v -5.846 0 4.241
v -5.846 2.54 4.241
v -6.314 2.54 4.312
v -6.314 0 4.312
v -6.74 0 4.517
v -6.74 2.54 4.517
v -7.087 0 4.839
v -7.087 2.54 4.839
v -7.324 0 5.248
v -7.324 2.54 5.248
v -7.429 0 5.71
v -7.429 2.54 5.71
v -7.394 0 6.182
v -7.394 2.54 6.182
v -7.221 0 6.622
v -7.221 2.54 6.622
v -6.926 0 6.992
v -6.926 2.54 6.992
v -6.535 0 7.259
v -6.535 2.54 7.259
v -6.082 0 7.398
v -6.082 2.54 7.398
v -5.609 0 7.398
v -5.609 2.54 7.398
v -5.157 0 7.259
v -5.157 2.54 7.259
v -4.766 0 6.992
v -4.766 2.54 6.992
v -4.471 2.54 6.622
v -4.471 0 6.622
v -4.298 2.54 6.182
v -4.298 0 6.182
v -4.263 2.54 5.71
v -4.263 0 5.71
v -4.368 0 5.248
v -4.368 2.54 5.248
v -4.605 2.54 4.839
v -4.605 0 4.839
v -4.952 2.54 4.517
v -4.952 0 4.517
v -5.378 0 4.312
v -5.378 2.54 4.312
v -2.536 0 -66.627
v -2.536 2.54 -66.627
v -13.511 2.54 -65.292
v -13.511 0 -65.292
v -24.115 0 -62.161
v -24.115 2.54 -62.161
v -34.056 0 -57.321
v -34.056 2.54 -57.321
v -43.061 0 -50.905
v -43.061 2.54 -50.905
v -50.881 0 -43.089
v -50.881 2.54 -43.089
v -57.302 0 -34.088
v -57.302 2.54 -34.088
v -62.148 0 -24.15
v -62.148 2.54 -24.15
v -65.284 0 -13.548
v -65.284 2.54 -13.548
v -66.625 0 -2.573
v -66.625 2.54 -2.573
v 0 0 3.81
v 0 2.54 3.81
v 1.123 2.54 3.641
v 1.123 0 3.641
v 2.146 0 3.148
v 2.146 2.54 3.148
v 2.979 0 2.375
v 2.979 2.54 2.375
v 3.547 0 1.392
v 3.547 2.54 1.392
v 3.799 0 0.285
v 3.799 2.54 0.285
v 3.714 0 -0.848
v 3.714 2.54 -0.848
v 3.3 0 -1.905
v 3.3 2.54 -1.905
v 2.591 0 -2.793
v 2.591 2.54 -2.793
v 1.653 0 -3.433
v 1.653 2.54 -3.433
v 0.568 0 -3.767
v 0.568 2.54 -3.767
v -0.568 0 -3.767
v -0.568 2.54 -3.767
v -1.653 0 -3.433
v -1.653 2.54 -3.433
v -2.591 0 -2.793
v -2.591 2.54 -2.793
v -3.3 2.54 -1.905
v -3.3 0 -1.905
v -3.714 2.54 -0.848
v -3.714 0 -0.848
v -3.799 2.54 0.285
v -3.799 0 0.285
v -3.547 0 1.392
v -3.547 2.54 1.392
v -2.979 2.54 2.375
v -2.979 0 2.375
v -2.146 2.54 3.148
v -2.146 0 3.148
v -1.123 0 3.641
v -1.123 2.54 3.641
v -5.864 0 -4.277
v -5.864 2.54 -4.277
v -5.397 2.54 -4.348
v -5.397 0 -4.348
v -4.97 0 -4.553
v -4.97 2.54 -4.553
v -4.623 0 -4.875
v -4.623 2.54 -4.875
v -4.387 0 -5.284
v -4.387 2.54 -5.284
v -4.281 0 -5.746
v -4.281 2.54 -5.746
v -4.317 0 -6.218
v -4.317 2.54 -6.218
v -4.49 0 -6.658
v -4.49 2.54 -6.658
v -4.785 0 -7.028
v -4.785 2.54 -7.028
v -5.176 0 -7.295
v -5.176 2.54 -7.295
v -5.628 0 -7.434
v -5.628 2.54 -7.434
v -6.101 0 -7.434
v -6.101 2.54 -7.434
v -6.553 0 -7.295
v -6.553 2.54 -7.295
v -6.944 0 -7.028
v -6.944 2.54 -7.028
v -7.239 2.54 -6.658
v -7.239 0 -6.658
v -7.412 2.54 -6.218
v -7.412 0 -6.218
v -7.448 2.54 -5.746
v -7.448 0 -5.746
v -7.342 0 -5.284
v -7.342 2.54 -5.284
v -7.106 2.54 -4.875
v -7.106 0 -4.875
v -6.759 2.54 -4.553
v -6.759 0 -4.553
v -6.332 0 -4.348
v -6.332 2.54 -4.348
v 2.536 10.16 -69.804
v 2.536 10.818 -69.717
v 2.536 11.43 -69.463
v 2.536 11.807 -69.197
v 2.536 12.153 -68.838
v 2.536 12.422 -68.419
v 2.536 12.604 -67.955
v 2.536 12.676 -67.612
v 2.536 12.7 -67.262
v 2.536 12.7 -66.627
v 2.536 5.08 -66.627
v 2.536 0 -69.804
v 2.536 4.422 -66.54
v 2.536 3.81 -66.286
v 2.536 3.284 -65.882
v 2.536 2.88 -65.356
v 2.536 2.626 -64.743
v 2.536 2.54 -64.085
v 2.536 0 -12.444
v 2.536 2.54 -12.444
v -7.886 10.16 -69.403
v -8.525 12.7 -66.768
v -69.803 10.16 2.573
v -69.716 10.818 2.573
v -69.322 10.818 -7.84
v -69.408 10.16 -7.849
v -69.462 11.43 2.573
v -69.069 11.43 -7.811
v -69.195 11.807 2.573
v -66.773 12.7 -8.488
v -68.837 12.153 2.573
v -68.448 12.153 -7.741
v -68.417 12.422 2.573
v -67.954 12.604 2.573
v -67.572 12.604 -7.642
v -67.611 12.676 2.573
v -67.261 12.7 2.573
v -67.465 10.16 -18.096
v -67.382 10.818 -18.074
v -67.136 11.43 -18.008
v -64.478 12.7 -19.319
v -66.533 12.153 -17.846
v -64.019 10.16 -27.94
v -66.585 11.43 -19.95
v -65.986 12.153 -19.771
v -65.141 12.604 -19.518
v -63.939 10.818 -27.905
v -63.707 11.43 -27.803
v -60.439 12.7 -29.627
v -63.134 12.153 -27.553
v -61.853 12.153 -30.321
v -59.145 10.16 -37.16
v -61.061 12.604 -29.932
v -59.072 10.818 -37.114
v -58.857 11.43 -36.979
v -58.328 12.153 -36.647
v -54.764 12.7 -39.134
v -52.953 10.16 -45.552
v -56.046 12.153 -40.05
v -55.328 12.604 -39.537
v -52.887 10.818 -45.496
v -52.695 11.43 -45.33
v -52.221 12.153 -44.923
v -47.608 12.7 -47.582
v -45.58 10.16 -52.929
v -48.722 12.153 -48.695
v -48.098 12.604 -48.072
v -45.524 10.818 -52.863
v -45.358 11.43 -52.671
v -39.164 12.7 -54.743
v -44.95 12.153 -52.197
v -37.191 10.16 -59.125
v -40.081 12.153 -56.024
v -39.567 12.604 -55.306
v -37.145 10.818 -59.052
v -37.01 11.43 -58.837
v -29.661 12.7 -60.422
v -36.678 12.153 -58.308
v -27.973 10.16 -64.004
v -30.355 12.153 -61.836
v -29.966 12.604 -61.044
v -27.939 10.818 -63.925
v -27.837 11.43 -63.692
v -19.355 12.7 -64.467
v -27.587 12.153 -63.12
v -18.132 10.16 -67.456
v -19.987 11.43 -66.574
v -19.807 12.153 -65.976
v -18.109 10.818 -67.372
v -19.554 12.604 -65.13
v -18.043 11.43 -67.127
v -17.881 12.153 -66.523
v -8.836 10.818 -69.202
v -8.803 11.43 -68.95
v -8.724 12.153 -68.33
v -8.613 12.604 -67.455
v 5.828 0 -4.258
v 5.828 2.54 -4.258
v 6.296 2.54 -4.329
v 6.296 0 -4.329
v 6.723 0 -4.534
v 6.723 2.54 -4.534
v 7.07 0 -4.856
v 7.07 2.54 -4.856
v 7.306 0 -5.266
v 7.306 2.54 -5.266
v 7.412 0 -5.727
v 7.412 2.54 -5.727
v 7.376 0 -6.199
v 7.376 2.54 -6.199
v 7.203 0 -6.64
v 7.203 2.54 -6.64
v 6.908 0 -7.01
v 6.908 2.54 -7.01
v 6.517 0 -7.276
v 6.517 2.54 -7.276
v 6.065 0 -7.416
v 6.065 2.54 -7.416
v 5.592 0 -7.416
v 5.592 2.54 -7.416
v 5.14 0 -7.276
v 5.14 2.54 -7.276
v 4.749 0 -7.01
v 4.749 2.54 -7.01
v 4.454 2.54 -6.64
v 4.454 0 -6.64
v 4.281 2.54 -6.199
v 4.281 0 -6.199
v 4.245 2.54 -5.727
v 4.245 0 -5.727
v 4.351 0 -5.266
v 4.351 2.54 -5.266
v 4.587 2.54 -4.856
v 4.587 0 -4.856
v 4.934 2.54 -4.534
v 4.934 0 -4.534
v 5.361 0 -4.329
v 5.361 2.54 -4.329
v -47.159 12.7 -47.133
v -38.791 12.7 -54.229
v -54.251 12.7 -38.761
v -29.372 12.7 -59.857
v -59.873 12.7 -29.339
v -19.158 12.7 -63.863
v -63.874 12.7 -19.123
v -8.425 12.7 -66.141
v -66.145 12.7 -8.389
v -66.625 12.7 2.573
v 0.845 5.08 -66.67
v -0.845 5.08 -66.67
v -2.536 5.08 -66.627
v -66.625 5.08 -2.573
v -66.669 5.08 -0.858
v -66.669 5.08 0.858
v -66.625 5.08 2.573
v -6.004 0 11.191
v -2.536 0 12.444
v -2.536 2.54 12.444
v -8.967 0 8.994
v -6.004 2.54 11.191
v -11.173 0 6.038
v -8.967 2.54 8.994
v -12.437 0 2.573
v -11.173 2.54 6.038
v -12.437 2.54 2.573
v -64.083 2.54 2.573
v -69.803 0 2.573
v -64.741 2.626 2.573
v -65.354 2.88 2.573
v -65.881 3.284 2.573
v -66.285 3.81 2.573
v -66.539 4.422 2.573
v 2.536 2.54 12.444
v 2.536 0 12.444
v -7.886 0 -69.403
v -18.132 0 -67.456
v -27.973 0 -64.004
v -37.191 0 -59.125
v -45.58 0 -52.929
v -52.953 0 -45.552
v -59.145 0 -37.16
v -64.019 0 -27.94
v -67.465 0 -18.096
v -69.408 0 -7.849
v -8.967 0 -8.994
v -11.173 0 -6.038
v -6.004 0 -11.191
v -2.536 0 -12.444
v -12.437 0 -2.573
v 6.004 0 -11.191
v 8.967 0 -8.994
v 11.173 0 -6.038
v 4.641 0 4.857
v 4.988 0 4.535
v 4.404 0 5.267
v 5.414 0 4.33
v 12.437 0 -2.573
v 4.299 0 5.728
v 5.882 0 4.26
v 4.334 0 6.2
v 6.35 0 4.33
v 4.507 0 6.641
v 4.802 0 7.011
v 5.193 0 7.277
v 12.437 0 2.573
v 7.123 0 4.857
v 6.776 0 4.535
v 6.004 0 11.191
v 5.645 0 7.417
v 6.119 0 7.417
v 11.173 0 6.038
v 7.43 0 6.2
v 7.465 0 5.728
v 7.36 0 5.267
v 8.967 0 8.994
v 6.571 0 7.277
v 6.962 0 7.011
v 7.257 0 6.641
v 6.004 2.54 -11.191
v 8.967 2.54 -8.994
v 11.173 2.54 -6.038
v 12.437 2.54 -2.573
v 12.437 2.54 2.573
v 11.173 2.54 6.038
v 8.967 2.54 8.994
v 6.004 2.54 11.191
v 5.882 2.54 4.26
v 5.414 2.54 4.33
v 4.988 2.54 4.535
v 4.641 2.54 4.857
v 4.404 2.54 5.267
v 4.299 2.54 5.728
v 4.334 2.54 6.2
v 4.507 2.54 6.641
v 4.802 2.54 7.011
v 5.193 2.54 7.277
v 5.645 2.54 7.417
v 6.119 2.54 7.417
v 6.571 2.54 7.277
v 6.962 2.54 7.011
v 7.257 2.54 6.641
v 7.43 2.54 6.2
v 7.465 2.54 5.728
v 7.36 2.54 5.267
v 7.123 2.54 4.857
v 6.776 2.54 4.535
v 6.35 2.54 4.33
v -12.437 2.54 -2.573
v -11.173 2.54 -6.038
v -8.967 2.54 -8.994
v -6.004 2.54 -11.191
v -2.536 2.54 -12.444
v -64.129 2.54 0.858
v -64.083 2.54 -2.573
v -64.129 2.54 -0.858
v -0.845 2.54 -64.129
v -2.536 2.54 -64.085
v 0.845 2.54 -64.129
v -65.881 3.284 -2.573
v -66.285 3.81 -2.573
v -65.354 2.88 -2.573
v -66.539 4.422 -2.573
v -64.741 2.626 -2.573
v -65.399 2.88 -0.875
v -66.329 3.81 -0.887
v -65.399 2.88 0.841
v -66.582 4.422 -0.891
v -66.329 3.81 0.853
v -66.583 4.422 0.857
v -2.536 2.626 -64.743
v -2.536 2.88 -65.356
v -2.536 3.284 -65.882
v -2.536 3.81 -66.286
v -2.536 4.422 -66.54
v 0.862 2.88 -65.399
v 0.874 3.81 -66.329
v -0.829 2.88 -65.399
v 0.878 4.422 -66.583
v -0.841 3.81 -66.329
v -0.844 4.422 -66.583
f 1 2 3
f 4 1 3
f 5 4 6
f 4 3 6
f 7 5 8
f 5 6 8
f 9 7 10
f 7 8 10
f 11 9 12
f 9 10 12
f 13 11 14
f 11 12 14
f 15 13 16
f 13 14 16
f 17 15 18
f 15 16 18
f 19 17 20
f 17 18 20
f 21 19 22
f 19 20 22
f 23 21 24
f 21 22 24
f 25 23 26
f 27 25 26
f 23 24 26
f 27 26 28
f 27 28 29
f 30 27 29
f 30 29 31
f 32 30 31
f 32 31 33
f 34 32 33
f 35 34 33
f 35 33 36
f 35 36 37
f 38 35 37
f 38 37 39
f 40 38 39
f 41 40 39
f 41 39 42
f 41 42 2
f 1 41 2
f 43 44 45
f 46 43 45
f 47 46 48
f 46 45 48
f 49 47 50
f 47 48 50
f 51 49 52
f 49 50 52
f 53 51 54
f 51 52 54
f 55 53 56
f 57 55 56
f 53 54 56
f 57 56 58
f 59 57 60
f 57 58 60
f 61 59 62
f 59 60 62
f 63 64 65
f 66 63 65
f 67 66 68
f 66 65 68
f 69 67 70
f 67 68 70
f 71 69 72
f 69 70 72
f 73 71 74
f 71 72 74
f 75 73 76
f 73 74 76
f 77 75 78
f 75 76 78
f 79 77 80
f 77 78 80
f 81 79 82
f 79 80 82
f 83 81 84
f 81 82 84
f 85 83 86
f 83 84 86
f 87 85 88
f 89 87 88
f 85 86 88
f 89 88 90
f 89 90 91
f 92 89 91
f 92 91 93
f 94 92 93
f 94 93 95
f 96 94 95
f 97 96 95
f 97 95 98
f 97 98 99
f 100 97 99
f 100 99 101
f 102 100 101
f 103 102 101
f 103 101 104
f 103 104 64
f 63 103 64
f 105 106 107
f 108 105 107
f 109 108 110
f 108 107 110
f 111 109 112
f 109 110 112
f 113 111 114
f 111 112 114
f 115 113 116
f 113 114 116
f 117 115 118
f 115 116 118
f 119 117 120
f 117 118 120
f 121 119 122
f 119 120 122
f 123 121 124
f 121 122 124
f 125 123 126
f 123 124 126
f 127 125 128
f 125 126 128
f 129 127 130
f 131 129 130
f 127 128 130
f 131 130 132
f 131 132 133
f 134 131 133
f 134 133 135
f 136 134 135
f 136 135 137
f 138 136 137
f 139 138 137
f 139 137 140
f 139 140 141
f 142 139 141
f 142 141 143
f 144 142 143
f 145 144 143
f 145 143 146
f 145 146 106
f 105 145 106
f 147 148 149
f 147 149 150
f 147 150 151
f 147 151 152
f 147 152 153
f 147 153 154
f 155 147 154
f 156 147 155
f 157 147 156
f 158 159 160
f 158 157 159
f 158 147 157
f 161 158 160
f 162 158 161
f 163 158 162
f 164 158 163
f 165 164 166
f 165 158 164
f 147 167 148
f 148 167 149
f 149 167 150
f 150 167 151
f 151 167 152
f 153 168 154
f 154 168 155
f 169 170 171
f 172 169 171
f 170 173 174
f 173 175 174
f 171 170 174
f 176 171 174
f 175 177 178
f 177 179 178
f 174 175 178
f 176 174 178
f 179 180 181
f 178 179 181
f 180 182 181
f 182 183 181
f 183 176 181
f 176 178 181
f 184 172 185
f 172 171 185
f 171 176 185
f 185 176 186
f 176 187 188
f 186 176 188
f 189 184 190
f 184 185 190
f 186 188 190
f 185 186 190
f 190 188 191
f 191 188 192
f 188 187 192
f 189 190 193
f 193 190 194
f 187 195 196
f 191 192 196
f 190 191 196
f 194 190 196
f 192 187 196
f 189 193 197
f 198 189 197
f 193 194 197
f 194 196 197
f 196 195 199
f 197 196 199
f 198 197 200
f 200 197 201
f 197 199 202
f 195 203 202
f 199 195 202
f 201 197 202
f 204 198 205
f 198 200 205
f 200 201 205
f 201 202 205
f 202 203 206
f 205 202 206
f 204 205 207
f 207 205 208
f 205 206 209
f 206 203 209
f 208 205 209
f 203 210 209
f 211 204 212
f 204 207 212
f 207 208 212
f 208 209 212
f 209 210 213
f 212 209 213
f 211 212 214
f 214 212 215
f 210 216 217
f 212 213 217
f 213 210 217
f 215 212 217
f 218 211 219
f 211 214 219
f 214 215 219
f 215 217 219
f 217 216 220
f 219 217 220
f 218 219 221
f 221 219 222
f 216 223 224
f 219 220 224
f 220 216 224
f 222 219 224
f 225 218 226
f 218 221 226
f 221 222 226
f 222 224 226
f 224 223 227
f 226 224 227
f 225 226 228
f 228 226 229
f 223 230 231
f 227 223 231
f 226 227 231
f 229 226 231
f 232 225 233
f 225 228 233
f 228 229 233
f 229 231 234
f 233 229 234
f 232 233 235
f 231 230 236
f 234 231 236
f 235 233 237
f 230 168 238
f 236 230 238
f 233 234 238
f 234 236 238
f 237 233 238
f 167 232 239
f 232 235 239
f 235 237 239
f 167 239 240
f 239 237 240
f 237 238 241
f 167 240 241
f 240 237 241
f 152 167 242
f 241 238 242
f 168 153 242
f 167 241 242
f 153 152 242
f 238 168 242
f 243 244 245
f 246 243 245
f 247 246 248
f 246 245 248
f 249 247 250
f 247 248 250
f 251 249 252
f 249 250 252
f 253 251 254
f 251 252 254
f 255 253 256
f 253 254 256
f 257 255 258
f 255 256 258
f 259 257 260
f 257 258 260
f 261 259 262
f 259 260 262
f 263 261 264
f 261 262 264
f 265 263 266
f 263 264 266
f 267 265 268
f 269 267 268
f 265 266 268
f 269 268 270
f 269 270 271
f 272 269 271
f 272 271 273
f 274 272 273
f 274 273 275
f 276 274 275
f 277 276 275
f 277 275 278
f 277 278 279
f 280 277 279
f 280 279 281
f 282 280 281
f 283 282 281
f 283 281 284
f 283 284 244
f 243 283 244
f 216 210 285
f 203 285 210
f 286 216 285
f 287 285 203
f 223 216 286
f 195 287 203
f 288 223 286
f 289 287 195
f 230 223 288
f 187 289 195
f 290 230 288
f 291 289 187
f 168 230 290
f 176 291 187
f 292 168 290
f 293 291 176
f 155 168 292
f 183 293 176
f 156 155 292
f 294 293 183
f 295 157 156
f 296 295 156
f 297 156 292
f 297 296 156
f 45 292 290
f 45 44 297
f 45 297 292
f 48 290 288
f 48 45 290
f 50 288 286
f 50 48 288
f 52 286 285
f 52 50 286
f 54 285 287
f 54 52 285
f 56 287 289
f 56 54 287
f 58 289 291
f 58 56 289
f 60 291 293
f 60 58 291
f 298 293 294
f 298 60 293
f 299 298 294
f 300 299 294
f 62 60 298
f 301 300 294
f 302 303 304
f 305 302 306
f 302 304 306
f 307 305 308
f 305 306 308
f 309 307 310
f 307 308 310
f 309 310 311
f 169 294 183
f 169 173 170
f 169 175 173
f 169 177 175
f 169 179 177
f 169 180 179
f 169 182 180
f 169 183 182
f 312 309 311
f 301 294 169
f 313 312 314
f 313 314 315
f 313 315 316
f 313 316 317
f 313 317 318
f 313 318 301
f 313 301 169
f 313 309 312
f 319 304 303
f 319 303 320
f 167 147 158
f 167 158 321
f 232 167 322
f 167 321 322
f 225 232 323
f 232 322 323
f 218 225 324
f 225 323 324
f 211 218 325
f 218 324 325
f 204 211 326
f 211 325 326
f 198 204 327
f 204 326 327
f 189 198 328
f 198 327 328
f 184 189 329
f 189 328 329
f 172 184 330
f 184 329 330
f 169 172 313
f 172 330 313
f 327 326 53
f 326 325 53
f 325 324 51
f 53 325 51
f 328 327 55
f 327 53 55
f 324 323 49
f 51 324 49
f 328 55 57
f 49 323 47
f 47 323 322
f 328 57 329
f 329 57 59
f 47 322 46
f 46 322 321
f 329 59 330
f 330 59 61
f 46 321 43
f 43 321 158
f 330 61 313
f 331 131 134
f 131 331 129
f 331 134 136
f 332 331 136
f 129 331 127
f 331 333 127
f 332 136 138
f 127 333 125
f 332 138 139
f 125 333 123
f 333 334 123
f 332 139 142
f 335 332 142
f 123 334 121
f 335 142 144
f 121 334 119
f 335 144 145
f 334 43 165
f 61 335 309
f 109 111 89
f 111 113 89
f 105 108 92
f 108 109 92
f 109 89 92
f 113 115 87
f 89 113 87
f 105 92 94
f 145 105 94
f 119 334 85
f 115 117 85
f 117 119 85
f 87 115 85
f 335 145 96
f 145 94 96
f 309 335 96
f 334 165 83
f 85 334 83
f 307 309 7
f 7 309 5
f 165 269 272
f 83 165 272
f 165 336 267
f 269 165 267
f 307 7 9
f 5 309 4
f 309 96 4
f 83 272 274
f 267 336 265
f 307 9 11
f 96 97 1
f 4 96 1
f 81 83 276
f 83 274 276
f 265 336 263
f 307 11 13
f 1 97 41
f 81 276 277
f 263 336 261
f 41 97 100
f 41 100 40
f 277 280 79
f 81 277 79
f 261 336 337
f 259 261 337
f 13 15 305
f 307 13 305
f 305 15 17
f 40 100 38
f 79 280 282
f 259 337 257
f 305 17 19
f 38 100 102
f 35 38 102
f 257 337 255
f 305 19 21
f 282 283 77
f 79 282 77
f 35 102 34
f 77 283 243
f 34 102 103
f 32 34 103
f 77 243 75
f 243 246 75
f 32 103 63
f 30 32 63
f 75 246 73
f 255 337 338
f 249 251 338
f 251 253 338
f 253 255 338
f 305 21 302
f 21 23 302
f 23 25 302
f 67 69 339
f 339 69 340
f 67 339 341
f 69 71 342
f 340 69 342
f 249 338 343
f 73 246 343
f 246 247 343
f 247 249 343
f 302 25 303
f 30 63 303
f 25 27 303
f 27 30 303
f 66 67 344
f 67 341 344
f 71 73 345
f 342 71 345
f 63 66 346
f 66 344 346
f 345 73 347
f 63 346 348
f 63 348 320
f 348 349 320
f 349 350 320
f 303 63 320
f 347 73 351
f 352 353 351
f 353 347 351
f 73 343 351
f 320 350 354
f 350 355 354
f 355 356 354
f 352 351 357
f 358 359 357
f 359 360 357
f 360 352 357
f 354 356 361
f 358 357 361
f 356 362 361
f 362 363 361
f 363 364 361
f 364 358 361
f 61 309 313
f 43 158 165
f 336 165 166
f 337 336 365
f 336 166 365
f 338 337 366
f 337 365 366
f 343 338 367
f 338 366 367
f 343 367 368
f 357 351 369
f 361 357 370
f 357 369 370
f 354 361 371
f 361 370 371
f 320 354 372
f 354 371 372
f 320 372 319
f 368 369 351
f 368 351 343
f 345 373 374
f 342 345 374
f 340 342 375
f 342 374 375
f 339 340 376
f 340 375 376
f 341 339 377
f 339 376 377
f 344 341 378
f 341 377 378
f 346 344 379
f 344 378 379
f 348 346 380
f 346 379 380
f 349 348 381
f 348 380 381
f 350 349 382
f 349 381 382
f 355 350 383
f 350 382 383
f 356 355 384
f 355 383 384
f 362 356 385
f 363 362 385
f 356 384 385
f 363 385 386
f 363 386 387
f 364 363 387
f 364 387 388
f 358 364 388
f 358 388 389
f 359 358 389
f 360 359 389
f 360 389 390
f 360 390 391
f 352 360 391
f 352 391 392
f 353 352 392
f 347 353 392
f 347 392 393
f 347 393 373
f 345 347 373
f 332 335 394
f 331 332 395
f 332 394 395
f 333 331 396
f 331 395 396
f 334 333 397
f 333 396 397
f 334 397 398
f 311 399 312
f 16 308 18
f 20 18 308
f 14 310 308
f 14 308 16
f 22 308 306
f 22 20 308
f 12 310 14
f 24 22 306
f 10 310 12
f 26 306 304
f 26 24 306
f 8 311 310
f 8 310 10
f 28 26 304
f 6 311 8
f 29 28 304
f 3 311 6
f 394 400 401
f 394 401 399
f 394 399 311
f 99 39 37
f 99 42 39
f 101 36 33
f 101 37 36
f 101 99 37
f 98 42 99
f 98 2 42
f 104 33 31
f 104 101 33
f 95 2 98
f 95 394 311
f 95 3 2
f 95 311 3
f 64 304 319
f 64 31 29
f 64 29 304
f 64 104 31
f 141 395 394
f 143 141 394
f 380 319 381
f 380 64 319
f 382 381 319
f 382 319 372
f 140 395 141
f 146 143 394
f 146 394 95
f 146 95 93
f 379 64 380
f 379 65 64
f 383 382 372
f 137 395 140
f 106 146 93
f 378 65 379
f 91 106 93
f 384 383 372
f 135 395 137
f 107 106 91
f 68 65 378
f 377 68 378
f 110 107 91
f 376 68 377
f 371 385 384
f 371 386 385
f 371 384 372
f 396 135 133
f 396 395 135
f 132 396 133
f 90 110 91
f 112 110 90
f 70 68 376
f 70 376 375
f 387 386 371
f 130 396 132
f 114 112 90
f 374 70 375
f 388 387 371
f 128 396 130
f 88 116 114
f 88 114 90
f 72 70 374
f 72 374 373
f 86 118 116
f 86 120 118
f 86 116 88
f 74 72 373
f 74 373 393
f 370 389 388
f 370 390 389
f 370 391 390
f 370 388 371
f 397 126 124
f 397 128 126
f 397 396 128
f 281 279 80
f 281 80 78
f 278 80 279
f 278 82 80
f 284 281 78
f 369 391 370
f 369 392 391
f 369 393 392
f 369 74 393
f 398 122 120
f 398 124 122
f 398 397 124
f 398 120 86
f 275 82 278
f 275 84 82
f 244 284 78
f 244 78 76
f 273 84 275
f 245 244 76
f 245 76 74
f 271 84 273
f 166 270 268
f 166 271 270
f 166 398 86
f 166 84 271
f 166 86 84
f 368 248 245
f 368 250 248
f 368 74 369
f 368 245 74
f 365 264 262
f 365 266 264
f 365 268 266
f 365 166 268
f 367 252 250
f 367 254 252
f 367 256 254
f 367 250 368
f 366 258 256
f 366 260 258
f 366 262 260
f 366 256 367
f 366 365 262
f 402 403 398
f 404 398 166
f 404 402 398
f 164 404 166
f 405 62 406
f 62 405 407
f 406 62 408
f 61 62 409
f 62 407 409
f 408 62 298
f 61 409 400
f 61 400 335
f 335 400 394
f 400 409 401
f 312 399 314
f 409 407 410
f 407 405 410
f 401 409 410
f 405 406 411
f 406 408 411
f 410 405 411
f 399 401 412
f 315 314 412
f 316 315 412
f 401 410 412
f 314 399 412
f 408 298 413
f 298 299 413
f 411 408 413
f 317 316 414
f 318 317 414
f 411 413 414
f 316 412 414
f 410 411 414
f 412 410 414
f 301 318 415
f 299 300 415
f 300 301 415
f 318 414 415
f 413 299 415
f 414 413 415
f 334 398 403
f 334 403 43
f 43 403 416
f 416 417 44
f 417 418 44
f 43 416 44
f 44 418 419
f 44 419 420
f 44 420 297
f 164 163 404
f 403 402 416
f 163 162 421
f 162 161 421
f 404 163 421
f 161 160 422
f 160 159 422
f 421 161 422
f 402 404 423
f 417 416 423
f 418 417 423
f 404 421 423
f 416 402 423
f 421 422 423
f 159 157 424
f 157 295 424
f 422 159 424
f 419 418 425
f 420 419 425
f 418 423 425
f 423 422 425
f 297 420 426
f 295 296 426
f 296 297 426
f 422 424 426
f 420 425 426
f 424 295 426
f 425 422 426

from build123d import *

# Parameters (mm, degrees)
SKETCH1_R           = 69.85
BOSS_EXTRUDE1_DEPTH = 12.7
CUT_EXTRUDE12_START = -10.16
CUT_EXTRUDE12_DEPTH = 10.16
SKETCH16_W          = 69.932780821
SKETCH16_H          = 69.651198358
BOSS_EXTRUDE5_DEPTH = 2.54
CUT_EXTRUDE13_DEPTH = 100.362175566
SKETCH19_R          = 3.81
SKETCH19_R_2        = 1.5875
CUT_EXTRUDE14_DEPTH = 100.362175566
FILLET27_R          = 2.54
FILLET28_R          = 2.54
FILLET31_R          = 2.54
CUT_EXTRUDE15_DEPTH = 100.362175647
CUT_EXTRUDE16_DEPTH = 100.595858501


with BuildPart() as part:
    # Sketch1 → Boss-Extrude1 (new body)
    with BuildSketch(Plane(origin=(0, 0, 0), x_dir=(1, 0, 0), z_dir=(0, 1, 0))):
        with Locations(Location((0, 0, 0), (0, 0, 270))):
            Circle(SKETCH1_R)
    extrude(amount=BOSS_EXTRUDE1_DEPTH)

    # Sketch15 → Cut-Extrude12 (cut)
    with BuildSketch(Plane(origin=(0, 12.7, 0), x_dir=(1, 0, 0), z_dir=(0, 1, 0)).offset(CUT_EXTRUDE12_START)):
        with BuildLine():
            Line((2.535588172, -66.626769527), (2.656330466, -69.799472838))
            ThreePointArc((2.656330466, -69.799472838), (49.392766771, -49.390050523), (69.799618816, -2.652491886))
            Line((69.799618816, -2.652491886), (66.626908869, -2.531924073))
            ThreePointArc((66.626908869, -2.531924073), (-47.147641009, 47.145048227), (2.535588172, -66.626769527))
        make_face()
    extrude(amount=CUT_EXTRUDE12_DEPTH, mode=Mode.SUBTRACT)

    # Sketch16 → Boss-Extrude5 (add)
    with BuildSketch(Plane(origin=(0, 2.54, 0), x_dir=(1, 0, 0), z_dir=(0, 1, 0))):
        with Locations((34.966390411, -34.825599179)):
            Rectangle(SKETCH16_W, SKETCH16_H)
    extrude(amount=-BOSS_EXTRUDE5_DEPTH)

    # Sketch18 → Cut-Extrude13 (cut, through all)
    with BuildSketch(Plane(origin=(0, 2.54, 0), x_dir=(1, 0, 0), z_dir=(0, 1, 0))):
        with BuildLine():
            Line((-2.535588172, -66.626769527), (-2.535588172, -12.444307639))
            ThreePointArc((-2.535588172, -12.444307639), (-8.966889105, -8.99360327), (-12.436709804, -2.572595822))
            Line((-12.436709804, -2.572595822), (-66.625350849, -2.572595822))
            ThreePointArc((-66.625350849, -2.572595822), (-47.133249027, -47.159436608), (-2.535588172, -66.626769527))
        make_face()
        with BuildLine():
            ThreePointArc((-12.436709804, 2.572595822), (-8.966889105, 8.99360327), (-2.535588172, 12.444307639))
            Line((-2.535588172, 12.444307639), (-2.535588172, 66.626769527))
            ThreePointArc((-2.535588172, 66.626769527), (-47.133249027, 47.159436608), (-66.625350849, 2.572595822))
            Line((-66.625350849, 2.572595822), (-12.436709804, 2.572595822))
        make_face()
        with BuildLine():
            Line((2.535588172, 66.626769527), (2.535588172, 12.444307639))
            ThreePointArc((2.535588172, 12.444307639), (8.966889105, 8.99360327), (12.436709804, 2.572595822))
            Line((12.436709804, 2.572595822), (66.625350849, 2.572595822))
            ThreePointArc((66.625350849, 2.572595822), (47.133249027, 47.159436608), (2.535588172, 66.626769527))
        make_face()
        with BuildLine():
            ThreePointArc((12.436709804, -2.572595822), (8.966889105, -8.99360327), (2.535588172, -12.444307639))
            Line((2.535588172, -12.444307639), (2.535588172, -66.626769527))
            ThreePointArc((2.535588172, -66.626769527), (47.133249027, -47.159436608), (66.625350849, -2.572595822))
            Line((66.625350849, -2.572595822), (12.436709804, -2.572595822))
        make_face()
    extrude(amount=-CUT_EXTRUDE13_DEPTH, mode=Mode.SUBTRACT)

    # Sketch19 → Cut-Extrude14 (cut, through all)
    with BuildSketch(Plane(origin=(0, 2.54, 0), x_dir=(1, 0, 0), z_dir=(0, 1, 0))):
        with Locations(Location((0, 0, 0), (0, 0, 270))):
            Circle(SKETCH19_R)
        with Locations(Location((5.828477918, 5.845842126, 0), (0, 0, 270))):
            Circle(SKETCH19_R_2)
        with Locations(Location((-5.845842126, -5.828477918, 0), (0, 0, 90))):
            Circle(SKETCH19_R_2)
        with Locations(Location((-5.864478401, 5.864478401, 0), (0, 0, 270))):
            Circle(SKETCH19_R_2)
        with Locations(Location((5.881897888, -5.847007018, 0), (0, 0, 90))):
            Circle(SKETCH19_R_2)
    extrude(amount=-CUT_EXTRUDE14_DEPTH, mode=Mode.SUBTRACT)

    # Fillet27
    fillet27_edges = [part.edges().sort_by_distance(p)[0] for p in [
        (-66.675, 2.54, 0),
    ]]
    fillet(fillet27_edges, radius=FILLET27_R)

    # Fillet28
    fillet28_edges = [part.edges().sort_by_distance(p)[0] for p in [
        (0, 2.54, -66.675),
    ]]
    fillet(fillet28_edges, radius=FILLET28_R)

    # Fillet31
    fillet31_edges = [part.edges().sort_by_distance(p)[0] for p in [
        (-49.392766771, 12.7, -49.390050523),
    ]]
    fillet(fillet31_edges, radius=FILLET31_R)

    # Sketch20 → Cut-Extrude15 (cut, through all)
    with BuildSketch(Plane(origin=(0, 2.54, 0), x_dir=(1, 0, 0), z_dir=(0, 1, 0))):
        with BuildLine():
            Line((-2.535588172, -12.444307639), (2.535588172, -12.444307639))
            Line((2.535588172, -12.444307639), (2.535588172, -66.626769527))
            ThreePointArc((2.535588172, -66.626769527), (0, -66.675), (-2.535588172, -66.626769527))
            Line((-2.535588172, -66.626769527), (-2.535588172, -12.444307639))
        make_face()
        with BuildLine():
            Line((12.436709804, -2.572595822), (12.436709804, 2.572595822))
            Line((12.436709804, 2.572595822), (66.625350849, 2.572595822))
            ThreePointArc((66.625350849, 2.572595822), (66.674996894, 0.02035079), (66.626908869, -2.531924073))
            Line((66.626908869, -2.531924073), (69.799618816, -2.652491886))
            ThreePointArc((69.799618816, -2.652491886), (69.837403568, -1.326485155), (69.85, 0))
            Line((69.85, 0), (69.932780821, 0))
            Line((69.932780821, 0), (69.932780821, -69.651198358))
            Line((69.932780821, -69.651198358), (5.266219444, -69.651198358))
            ThreePointArc((5.266219444, -69.651198358), (3.961968652, -69.737545873), (2.656330466, -69.799472838))
            Line((2.656330466, -69.799472838), (2.535588172, -66.626769527))
            ThreePointArc((2.535588172, -66.626769527), (47.133249027, -47.159436608), (66.625350849, -2.572595822))
            Line((66.625350849, -2.572595822), (12.436709804, -2.572595822))
        make_face()
    extrude(amount=-CUT_EXTRUDE15_DEPTH, mode=Mode.SUBTRACT)

    # Sketch21 → Cut-Extrude16 (cut, through all)
    with BuildSketch(Plane.XZ):
        with BuildLine():
            Line((-12.436709804, 2.572595822), (-72.625686252, 2.572595822))
            Line((-72.625686252, 2.572595822), (-72.625686252, 86.482314908))
            Line((-72.625686252, 86.482314908), (90.769446287, 86.482314908))
            Line((90.769446287, 86.482314908), (90.769446287, -81.729929128))
            Line((90.769446287, -81.729929128), (2.535588172, -81.729929128))
            Line((2.535588172, -81.729929128), (2.535588172, -12.444307639))
            ThreePointArc((2.535588172, -12.444307639), (8.966889105, -8.99360327), (12.436709804, -2.572595822))
            Line((12.436709804, -2.572595822), (12.436709804, 2.572595822))
            ThreePointArc((12.436709804, 2.572595822), (8.966889105, 8.99360327), (2.535588172, 12.444307639))
            Line((2.535588172, 12.444307639), (-2.535588172, 12.444307639))
            ThreePointArc((-2.535588172, 12.444307639), (-8.966889105, 8.99360327), (-12.436709804, 2.572595822))
        make_face()
    extrude(amount=-CUT_EXTRUDE16_DEPTH, mode=Mode.SUBTRACT)


solid = part.part
